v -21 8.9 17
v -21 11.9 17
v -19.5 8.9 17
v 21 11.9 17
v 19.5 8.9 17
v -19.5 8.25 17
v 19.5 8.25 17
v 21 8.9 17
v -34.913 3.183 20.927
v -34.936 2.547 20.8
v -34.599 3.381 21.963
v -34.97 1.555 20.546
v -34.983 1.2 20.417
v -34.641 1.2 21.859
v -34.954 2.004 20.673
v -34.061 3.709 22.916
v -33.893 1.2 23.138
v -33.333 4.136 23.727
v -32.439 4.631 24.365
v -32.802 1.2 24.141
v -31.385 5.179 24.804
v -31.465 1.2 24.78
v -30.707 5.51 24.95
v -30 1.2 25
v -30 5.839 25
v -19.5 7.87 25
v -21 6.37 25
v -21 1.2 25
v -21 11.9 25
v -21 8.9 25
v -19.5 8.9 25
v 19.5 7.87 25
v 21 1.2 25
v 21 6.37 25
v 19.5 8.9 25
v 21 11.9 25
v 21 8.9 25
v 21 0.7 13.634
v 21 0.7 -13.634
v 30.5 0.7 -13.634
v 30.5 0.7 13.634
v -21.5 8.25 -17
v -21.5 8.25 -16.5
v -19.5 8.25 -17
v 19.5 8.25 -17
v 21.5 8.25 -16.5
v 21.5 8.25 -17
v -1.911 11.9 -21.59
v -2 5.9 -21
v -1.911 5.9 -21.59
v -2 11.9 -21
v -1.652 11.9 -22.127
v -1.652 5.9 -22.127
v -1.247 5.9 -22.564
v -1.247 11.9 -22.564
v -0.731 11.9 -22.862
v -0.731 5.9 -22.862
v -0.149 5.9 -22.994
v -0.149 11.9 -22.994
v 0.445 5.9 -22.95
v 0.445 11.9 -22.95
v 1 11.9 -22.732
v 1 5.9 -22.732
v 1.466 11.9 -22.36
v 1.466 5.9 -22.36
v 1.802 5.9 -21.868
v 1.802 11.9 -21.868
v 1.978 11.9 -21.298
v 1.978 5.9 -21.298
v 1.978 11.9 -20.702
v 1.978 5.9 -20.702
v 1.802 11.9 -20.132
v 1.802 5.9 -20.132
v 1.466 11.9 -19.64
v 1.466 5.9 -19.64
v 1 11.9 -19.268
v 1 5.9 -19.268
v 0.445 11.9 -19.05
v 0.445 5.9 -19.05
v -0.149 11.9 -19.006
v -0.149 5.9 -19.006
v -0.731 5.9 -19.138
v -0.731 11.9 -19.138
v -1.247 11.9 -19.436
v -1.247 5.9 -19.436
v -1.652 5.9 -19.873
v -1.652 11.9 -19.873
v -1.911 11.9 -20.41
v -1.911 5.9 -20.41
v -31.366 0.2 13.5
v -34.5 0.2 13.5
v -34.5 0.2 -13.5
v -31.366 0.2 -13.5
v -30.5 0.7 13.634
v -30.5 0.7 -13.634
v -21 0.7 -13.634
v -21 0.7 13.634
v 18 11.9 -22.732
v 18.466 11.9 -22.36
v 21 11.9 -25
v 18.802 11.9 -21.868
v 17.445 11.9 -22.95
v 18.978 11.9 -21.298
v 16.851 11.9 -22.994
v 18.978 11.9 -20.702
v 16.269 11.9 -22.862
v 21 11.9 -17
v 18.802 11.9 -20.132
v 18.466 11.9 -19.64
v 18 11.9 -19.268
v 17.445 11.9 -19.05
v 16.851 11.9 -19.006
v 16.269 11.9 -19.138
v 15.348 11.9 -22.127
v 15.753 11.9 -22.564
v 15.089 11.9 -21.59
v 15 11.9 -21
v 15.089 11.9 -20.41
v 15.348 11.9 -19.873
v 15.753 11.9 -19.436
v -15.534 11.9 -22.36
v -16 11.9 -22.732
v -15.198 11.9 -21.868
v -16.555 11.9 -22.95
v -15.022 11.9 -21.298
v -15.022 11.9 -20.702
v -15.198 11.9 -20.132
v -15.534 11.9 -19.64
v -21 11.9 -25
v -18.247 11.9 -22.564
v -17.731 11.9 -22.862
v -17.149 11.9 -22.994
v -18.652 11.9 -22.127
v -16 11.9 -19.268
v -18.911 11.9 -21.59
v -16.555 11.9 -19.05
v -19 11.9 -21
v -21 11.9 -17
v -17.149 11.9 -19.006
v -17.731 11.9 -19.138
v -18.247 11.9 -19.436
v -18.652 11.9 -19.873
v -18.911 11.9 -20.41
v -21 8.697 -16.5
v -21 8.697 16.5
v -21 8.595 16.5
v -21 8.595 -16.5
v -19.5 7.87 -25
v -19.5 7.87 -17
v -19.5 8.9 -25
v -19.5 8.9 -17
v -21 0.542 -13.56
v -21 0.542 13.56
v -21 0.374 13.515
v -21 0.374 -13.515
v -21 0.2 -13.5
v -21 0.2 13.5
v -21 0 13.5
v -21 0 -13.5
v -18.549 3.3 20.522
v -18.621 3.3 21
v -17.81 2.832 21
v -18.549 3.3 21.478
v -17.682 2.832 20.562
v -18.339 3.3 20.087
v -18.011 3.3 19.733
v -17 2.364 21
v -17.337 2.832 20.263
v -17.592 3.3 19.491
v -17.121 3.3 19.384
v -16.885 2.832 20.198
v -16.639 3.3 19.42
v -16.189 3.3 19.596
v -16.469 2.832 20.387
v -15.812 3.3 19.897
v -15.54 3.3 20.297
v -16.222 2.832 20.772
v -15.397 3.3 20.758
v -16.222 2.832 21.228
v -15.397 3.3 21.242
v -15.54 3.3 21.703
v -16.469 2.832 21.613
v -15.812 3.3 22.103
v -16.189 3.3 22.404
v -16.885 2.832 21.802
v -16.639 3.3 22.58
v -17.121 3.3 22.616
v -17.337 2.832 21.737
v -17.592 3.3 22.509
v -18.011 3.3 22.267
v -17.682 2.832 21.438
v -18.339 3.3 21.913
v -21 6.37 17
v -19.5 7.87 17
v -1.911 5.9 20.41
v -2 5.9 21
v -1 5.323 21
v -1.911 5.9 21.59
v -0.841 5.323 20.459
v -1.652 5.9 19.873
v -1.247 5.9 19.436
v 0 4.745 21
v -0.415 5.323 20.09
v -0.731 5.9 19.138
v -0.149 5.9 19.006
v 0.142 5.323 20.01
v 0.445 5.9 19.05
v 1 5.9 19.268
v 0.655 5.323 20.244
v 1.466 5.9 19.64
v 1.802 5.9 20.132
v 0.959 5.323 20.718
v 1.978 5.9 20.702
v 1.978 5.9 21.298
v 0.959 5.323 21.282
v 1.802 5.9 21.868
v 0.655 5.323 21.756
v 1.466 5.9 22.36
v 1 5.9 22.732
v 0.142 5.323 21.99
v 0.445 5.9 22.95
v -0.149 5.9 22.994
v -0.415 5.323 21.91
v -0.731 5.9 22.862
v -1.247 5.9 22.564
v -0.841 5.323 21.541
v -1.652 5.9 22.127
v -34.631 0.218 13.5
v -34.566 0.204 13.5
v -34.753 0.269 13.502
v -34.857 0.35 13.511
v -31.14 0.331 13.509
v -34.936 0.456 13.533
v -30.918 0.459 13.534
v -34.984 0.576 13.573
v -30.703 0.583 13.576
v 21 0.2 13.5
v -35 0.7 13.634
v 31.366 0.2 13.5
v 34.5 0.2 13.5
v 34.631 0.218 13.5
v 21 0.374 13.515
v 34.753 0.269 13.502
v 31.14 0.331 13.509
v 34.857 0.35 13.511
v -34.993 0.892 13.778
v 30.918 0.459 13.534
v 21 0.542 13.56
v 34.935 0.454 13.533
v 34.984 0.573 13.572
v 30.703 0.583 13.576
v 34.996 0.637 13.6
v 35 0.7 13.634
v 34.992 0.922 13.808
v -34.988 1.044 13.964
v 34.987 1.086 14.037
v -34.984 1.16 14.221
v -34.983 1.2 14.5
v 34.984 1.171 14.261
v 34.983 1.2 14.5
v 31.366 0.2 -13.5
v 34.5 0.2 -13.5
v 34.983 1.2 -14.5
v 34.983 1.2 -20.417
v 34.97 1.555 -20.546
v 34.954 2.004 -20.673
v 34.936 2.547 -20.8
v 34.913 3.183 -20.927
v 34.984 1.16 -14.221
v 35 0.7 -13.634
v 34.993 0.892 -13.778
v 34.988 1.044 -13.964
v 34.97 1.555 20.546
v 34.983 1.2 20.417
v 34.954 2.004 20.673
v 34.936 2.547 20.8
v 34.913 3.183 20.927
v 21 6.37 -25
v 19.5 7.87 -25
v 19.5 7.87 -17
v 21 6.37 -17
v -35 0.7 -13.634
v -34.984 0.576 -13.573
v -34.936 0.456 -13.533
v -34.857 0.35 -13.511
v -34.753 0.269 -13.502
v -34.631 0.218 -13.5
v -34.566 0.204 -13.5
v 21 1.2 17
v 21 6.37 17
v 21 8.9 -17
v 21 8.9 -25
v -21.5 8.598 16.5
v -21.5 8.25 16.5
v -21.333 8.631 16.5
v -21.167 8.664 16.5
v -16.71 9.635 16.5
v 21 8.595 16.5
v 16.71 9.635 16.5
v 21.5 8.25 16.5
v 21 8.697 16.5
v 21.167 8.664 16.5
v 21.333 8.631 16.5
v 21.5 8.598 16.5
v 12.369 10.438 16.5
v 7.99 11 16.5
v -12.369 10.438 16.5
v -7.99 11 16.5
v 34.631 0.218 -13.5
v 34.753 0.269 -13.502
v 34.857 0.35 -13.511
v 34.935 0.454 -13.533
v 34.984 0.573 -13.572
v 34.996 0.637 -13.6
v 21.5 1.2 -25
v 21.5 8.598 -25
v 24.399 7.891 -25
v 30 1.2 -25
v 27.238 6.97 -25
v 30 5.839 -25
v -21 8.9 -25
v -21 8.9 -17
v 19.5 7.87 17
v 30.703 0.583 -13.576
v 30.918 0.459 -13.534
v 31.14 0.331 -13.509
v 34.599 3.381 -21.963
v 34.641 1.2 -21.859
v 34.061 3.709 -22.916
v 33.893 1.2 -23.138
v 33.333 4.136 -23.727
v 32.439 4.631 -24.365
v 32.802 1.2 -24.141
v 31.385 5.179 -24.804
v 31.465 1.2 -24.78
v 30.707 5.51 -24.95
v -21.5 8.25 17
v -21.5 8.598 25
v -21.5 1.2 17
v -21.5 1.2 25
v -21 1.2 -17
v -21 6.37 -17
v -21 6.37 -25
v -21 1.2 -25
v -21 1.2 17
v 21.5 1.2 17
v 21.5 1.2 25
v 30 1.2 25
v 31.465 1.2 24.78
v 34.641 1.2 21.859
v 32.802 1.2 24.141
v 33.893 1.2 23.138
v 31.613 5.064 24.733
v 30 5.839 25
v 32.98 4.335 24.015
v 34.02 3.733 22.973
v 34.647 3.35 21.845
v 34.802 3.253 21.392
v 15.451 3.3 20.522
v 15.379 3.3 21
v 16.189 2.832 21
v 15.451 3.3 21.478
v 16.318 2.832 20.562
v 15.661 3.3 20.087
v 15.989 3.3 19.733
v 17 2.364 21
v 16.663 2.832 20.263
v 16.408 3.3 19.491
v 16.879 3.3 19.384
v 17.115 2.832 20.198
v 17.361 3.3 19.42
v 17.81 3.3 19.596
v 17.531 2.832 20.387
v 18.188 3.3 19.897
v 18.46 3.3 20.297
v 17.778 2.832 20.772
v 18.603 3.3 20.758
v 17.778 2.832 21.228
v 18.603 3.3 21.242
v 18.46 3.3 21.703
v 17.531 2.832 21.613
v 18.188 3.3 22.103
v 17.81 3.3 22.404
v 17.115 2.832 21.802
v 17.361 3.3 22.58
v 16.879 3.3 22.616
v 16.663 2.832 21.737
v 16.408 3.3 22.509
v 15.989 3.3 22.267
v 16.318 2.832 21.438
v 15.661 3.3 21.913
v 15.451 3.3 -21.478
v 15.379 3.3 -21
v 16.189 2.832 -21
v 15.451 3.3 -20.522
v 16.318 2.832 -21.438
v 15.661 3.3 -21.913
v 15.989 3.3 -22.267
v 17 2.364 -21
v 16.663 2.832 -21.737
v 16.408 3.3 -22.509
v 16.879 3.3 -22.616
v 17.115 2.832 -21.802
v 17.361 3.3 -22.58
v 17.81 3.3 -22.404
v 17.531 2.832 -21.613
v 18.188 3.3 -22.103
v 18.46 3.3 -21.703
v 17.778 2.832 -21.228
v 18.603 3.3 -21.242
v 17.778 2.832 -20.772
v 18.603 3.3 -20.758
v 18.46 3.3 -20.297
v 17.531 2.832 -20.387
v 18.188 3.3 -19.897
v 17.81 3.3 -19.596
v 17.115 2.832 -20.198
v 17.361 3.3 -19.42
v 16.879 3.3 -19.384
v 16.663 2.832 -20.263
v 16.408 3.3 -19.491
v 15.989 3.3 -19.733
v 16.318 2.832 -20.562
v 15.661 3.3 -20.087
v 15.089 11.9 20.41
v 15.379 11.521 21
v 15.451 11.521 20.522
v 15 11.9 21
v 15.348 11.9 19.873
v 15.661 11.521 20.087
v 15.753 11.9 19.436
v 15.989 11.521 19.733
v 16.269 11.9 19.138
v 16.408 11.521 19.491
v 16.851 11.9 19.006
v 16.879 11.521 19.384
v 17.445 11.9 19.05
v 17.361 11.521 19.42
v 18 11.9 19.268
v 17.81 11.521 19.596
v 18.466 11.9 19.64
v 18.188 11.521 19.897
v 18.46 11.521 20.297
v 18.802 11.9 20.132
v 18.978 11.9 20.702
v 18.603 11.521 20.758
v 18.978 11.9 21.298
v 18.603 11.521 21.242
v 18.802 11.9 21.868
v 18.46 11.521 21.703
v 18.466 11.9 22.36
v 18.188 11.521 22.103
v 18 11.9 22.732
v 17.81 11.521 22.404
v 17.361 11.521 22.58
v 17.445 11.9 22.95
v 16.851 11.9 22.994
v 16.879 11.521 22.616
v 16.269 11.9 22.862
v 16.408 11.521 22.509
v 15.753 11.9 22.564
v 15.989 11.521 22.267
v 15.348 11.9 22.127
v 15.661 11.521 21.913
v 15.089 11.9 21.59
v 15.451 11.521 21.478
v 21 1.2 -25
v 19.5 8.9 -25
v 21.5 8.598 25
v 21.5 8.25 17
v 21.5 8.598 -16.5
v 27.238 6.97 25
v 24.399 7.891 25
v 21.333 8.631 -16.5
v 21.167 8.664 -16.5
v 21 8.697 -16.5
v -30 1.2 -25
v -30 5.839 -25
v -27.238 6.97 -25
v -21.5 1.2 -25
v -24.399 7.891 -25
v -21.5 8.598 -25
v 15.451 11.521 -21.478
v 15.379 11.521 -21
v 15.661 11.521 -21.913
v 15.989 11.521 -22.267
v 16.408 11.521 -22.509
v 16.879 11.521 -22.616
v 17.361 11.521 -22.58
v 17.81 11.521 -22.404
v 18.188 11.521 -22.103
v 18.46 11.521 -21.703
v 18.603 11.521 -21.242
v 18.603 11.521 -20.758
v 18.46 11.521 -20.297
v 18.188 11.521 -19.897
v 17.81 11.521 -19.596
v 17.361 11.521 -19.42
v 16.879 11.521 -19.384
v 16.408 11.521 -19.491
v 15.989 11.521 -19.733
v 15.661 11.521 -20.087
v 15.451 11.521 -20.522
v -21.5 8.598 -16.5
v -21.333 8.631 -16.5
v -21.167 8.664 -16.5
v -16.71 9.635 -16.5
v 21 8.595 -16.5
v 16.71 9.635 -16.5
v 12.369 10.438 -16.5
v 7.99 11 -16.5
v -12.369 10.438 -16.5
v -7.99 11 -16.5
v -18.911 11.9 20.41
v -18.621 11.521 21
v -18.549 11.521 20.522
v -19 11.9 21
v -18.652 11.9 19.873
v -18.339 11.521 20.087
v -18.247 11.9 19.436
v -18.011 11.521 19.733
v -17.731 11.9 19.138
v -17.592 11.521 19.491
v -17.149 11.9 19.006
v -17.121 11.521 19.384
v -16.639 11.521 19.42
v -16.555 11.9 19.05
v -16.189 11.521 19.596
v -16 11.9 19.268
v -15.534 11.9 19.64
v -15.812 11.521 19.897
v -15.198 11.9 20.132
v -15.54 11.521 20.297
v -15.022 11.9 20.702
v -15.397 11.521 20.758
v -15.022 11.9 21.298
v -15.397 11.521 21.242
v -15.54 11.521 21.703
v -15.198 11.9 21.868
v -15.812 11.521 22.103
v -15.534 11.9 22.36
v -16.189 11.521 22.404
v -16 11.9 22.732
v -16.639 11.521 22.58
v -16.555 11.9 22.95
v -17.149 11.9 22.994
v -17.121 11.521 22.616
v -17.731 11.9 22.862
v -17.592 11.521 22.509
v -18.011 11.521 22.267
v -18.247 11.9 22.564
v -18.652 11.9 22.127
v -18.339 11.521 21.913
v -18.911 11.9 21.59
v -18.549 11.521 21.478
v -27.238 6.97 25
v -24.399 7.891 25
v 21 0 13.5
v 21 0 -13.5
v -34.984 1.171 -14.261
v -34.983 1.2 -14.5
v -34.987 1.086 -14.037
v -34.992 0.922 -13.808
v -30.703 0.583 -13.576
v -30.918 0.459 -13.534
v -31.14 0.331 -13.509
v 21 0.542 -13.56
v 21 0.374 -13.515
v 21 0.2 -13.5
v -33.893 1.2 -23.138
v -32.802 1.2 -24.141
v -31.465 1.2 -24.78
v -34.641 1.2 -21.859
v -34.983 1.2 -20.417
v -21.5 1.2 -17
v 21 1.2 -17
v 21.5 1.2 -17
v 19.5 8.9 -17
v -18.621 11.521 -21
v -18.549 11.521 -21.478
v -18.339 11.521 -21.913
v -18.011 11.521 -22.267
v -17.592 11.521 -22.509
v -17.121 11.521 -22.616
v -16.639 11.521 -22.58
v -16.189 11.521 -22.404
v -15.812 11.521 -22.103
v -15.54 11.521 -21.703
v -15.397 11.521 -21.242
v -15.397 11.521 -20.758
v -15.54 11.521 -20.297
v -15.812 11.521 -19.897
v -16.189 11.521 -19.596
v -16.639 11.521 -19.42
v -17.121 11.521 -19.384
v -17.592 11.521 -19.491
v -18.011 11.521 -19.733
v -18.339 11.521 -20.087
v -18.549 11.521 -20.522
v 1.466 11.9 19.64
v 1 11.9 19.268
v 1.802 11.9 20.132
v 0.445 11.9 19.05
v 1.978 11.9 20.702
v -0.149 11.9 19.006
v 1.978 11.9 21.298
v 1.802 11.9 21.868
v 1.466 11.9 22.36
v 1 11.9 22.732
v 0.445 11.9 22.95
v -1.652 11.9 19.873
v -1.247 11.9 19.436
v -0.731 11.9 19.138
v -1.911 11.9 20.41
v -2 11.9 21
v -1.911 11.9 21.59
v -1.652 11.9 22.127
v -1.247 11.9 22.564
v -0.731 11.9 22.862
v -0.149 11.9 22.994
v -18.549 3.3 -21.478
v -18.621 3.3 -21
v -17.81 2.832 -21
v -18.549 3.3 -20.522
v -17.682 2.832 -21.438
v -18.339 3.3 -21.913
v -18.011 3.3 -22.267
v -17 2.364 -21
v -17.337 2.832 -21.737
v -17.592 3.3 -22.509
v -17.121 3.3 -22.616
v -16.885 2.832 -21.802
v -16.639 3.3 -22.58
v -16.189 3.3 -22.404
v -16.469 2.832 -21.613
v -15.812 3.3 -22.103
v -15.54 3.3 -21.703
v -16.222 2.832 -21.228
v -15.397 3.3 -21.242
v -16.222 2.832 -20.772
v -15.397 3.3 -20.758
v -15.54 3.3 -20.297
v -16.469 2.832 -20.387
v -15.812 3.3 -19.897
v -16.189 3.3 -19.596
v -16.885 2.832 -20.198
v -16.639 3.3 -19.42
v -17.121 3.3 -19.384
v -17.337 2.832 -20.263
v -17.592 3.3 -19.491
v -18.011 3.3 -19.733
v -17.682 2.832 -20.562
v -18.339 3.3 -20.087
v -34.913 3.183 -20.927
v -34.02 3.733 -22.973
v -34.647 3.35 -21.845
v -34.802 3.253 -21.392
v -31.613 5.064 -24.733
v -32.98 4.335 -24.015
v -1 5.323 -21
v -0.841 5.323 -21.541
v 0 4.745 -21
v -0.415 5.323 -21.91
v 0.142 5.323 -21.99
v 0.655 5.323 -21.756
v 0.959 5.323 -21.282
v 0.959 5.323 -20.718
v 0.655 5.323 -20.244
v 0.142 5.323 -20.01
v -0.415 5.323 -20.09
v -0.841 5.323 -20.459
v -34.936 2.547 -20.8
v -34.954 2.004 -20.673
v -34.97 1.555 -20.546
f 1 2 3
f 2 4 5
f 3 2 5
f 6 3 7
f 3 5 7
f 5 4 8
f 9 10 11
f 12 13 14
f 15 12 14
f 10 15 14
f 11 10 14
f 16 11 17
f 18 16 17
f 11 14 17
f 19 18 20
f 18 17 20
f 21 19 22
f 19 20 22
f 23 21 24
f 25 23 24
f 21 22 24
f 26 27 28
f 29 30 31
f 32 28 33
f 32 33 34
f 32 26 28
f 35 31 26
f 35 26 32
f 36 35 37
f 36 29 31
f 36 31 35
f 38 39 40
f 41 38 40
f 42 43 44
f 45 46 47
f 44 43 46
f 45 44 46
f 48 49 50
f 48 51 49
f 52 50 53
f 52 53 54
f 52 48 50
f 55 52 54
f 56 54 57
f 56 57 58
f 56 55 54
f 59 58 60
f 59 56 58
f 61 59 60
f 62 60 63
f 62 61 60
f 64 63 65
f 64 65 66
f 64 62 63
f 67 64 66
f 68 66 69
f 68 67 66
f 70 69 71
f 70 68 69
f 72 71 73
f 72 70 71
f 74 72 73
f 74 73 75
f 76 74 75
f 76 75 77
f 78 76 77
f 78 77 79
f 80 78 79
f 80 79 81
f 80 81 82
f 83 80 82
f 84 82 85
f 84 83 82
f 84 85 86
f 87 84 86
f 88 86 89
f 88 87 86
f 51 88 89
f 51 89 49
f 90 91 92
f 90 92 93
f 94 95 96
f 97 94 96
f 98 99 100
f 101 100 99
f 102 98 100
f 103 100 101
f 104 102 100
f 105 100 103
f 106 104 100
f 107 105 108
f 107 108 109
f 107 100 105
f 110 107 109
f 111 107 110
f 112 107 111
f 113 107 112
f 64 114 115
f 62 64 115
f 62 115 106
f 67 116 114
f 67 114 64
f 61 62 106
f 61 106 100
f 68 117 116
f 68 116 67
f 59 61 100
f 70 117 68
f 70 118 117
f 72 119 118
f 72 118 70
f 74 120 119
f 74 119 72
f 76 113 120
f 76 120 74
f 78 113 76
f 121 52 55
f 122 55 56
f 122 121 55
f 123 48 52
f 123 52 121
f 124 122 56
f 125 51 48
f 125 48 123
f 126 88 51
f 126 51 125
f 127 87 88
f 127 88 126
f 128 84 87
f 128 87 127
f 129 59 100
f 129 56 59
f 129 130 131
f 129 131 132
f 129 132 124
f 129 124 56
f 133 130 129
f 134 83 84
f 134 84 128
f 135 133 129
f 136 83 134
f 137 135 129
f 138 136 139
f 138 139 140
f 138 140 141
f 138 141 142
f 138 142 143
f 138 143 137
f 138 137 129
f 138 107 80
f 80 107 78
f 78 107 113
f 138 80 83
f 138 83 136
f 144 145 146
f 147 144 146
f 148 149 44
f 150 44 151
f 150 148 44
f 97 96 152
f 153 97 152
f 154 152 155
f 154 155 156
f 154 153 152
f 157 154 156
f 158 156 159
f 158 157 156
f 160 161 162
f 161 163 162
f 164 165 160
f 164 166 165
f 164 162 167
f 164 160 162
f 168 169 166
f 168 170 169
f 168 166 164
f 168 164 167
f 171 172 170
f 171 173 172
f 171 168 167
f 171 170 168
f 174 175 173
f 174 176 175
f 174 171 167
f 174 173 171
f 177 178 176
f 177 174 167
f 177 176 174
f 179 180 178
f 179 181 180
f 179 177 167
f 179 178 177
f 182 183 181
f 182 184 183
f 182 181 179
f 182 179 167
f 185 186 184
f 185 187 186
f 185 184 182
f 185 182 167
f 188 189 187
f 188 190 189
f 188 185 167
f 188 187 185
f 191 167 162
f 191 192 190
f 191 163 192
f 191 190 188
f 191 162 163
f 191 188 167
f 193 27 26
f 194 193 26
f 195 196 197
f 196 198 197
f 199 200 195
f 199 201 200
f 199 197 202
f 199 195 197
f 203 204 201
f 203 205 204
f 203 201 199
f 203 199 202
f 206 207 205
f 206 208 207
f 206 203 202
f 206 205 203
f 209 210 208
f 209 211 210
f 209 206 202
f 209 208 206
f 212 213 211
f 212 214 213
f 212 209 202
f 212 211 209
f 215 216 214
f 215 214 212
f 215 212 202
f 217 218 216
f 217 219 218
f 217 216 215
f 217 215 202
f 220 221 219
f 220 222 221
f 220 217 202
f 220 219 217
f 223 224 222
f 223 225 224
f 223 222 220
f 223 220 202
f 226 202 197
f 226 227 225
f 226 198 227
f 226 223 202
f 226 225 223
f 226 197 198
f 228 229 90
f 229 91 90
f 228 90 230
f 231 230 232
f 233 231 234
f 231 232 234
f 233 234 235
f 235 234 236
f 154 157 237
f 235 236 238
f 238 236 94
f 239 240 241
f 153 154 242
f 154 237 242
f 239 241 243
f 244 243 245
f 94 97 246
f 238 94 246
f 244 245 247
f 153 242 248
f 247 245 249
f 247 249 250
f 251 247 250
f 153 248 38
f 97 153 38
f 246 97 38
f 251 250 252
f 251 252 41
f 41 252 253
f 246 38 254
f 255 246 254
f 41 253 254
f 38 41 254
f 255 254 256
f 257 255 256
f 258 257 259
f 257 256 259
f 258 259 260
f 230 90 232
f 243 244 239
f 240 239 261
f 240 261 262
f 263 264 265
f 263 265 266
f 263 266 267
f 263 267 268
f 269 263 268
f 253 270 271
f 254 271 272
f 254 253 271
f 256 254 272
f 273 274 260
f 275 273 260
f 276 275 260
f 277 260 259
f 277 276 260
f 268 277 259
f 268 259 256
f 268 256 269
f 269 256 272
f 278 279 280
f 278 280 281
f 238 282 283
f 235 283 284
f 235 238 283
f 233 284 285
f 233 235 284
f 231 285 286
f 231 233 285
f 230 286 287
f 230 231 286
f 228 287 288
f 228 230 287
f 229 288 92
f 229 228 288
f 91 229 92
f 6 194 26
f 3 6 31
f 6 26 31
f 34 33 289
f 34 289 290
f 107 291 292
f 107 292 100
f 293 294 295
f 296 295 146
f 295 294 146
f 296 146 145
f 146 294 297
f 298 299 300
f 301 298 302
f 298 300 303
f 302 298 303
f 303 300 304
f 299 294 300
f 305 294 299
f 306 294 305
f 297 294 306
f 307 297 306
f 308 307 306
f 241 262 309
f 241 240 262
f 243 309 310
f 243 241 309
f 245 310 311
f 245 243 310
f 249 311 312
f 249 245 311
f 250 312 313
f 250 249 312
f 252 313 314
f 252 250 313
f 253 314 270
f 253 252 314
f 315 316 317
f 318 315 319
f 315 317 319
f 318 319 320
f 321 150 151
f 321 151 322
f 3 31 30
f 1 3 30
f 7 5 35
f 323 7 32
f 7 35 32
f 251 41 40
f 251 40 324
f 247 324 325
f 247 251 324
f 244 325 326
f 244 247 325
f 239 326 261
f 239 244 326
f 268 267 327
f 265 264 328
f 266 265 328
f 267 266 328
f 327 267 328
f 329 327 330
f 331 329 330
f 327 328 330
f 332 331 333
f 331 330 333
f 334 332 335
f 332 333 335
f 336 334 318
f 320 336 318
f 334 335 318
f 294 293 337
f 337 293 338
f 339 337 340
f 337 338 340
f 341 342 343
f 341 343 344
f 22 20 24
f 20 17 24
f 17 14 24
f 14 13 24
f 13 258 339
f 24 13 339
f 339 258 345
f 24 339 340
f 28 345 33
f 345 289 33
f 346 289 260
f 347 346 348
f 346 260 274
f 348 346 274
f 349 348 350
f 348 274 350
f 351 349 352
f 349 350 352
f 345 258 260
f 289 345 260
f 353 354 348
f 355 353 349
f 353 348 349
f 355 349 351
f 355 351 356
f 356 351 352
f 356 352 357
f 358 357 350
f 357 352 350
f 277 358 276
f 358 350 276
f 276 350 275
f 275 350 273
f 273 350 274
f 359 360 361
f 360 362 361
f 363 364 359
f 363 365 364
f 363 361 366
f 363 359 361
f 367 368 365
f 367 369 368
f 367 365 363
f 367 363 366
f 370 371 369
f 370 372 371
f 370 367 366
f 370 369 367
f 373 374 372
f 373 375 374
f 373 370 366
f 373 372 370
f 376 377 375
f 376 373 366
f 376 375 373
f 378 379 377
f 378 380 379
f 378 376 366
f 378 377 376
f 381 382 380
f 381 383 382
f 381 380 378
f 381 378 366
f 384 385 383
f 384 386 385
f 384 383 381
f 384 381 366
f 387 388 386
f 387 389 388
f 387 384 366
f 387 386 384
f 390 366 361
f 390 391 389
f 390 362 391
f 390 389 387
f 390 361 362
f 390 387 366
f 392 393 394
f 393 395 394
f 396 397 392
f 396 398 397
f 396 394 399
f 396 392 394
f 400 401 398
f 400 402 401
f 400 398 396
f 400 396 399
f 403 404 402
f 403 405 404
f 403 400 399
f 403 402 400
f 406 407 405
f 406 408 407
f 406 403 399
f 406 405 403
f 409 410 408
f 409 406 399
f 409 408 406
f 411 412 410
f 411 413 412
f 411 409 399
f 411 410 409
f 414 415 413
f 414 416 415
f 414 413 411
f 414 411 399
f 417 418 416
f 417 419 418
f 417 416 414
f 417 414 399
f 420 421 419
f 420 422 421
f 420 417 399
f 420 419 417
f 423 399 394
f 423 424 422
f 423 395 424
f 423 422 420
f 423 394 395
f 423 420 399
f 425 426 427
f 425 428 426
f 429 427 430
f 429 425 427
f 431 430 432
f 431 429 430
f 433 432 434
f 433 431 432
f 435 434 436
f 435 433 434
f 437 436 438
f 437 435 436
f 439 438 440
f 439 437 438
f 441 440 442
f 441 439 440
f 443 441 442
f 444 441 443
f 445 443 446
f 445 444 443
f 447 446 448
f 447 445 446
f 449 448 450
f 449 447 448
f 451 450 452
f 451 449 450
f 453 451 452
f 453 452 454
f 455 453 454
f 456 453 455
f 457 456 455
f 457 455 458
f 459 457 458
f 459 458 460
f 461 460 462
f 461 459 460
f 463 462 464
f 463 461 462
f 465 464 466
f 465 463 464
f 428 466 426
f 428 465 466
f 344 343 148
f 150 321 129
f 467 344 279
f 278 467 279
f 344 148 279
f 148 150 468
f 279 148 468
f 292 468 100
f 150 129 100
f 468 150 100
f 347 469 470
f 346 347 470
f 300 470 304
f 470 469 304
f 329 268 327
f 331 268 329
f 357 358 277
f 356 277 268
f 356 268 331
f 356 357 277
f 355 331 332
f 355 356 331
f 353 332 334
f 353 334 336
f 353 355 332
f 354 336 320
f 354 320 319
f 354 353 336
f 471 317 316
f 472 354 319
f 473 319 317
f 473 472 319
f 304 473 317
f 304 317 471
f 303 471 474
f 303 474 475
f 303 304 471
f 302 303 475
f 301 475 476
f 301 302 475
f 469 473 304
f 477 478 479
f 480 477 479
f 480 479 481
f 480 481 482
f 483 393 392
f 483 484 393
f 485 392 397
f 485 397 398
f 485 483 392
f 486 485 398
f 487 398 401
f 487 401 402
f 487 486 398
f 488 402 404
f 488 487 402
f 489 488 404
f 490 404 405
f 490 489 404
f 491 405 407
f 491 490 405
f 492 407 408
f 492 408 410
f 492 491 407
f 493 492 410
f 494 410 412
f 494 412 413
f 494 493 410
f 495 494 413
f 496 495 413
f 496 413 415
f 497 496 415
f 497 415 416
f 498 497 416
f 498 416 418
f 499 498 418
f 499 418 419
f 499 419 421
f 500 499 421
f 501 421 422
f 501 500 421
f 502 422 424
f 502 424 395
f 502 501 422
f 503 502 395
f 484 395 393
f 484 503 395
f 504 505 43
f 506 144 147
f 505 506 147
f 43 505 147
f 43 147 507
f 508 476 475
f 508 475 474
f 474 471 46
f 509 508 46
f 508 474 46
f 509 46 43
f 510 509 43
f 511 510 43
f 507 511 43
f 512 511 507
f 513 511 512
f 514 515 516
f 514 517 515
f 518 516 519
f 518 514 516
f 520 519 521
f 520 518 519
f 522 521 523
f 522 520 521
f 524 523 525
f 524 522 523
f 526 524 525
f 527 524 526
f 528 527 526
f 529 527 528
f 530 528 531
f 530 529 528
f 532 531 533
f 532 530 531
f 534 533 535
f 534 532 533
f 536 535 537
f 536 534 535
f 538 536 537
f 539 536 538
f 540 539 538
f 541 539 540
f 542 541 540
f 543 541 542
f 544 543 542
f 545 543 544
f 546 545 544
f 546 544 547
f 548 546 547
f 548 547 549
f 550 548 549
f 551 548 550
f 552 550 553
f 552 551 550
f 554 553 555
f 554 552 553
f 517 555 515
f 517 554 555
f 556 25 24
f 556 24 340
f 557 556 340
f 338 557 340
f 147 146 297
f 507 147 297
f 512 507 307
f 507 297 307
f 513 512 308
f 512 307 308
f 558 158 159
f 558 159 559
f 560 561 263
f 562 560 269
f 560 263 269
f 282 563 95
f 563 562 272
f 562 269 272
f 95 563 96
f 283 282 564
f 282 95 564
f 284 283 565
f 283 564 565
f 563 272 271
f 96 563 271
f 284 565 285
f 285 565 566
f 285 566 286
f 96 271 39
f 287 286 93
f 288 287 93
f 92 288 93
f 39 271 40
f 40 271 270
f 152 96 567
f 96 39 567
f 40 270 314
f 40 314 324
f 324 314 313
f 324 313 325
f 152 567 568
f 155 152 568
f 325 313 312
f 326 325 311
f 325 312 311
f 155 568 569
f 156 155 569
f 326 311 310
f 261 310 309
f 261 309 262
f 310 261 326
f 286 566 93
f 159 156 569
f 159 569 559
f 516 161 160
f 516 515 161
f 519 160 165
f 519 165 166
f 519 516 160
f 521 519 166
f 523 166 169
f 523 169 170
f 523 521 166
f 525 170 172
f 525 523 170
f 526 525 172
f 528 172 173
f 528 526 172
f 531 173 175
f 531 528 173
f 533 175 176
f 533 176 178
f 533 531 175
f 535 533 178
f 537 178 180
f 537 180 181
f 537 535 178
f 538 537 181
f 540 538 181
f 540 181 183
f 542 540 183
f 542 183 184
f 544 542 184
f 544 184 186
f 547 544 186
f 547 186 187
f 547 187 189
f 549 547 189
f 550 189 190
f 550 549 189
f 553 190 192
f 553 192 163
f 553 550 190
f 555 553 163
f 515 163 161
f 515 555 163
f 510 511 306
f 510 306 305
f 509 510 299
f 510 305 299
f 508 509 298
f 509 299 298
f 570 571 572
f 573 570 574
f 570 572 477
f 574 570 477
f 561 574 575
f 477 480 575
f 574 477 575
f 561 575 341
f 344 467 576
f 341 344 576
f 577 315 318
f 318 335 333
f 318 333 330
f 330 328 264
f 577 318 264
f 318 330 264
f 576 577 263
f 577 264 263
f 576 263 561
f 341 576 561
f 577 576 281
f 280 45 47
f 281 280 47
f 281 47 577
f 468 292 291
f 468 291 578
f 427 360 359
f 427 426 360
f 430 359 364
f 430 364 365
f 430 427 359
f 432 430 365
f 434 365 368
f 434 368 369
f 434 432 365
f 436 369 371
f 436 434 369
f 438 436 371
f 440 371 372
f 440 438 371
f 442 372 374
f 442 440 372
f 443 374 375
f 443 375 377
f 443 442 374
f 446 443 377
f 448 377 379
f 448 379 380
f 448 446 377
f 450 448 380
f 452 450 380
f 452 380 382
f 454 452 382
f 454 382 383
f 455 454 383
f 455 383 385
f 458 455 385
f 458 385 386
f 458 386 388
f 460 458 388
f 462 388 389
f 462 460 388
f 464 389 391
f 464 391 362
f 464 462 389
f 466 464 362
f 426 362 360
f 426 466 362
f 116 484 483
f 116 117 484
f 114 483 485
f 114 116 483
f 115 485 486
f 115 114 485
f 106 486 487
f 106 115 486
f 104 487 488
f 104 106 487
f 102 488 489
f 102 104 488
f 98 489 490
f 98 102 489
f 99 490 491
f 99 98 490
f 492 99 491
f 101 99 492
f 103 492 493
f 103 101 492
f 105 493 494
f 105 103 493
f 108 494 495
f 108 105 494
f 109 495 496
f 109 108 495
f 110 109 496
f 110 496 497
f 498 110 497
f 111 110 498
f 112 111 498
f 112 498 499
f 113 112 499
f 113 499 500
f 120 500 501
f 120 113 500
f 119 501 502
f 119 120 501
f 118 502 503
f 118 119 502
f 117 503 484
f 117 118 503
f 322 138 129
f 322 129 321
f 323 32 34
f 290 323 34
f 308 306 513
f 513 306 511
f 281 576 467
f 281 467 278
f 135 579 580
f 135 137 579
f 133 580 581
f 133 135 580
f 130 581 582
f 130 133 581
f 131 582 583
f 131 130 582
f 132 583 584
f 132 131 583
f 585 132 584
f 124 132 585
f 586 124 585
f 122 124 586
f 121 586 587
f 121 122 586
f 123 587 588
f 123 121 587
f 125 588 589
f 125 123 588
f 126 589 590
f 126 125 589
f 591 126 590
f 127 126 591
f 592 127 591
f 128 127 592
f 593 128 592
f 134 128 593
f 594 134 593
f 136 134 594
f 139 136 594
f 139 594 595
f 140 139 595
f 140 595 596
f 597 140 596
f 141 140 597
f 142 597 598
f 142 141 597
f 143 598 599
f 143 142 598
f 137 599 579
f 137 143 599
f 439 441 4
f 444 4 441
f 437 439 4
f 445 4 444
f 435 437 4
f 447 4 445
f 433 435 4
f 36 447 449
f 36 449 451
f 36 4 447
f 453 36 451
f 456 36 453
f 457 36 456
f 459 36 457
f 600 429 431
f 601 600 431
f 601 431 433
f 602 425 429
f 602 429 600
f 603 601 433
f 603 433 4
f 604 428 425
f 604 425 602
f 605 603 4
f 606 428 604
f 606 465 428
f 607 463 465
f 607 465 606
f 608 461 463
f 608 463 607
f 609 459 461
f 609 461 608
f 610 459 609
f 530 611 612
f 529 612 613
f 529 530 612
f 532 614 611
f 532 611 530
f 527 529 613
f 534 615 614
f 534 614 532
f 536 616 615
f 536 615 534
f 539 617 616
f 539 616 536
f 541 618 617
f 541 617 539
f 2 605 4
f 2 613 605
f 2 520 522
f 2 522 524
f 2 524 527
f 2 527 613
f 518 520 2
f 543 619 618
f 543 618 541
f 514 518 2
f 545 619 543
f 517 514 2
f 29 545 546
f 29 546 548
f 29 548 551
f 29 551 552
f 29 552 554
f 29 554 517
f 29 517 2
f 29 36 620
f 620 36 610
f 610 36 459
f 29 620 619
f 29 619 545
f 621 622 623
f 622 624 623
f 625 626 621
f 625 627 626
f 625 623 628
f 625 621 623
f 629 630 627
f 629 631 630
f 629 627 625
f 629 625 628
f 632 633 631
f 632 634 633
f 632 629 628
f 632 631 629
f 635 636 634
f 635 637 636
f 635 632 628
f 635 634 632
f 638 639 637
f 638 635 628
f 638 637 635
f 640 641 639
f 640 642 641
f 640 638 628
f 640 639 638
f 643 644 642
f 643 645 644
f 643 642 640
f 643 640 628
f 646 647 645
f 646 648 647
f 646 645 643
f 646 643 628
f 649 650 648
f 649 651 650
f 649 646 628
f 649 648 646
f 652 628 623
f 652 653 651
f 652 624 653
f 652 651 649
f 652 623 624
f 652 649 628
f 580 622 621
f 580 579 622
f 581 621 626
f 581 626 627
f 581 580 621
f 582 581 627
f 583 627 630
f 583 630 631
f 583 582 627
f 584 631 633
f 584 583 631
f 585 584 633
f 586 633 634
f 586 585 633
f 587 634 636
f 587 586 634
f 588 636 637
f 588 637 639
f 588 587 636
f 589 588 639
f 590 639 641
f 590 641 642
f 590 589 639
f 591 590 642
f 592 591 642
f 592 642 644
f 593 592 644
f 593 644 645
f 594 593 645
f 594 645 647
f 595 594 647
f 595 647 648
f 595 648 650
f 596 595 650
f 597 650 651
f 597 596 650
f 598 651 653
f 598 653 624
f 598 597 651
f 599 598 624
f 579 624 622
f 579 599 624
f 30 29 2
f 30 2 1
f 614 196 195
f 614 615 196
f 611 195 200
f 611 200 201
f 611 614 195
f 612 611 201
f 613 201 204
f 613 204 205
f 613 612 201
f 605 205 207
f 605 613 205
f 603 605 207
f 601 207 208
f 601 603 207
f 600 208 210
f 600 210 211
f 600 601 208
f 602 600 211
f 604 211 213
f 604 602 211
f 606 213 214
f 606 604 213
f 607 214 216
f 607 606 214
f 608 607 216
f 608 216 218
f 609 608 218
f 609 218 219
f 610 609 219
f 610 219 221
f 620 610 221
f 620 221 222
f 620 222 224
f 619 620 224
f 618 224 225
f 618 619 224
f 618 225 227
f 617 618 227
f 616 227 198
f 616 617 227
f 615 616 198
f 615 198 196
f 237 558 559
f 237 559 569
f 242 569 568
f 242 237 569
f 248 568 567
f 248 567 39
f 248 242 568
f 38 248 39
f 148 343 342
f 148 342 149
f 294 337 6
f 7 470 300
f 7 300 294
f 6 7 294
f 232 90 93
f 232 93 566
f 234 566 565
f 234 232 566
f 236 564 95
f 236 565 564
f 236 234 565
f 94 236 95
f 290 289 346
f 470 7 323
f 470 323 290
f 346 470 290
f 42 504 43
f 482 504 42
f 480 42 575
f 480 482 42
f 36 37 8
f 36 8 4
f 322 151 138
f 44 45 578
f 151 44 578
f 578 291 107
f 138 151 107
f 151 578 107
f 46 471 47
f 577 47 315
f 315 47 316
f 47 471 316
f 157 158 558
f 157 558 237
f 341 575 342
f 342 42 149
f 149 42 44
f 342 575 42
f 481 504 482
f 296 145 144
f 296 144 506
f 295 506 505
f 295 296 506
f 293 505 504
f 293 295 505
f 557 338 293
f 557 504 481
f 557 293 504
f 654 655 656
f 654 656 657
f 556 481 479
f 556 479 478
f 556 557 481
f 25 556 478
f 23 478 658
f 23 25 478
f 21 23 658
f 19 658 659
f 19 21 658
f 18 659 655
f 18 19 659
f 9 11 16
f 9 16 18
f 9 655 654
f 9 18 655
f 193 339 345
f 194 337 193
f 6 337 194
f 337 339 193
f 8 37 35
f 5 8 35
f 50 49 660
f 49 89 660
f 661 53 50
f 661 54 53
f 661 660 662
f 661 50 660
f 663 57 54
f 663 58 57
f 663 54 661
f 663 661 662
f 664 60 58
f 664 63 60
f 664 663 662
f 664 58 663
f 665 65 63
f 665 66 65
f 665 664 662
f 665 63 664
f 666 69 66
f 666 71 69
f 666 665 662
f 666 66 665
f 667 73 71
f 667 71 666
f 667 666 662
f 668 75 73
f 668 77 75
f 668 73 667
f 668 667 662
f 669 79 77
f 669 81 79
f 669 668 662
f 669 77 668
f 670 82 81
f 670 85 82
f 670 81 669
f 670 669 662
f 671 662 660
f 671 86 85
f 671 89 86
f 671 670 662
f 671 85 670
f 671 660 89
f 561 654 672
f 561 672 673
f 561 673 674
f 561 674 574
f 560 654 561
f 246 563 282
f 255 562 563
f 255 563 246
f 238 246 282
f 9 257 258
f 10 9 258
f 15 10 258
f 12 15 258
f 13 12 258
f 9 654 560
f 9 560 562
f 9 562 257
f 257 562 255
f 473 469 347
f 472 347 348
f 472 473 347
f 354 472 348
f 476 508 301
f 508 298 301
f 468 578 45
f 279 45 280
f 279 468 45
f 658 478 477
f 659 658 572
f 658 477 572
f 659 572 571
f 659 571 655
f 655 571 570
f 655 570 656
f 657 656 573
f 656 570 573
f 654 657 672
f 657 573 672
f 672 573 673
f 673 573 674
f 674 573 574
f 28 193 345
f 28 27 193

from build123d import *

# Parameters (mm, degrees)
BOSS_EXTRUDE1_DEPTH      = 25
BOSS_EXTRUDE1_DEPTH_BACK = 25
CUT_EXTRUDE1_DEPTH       = 17
CUT_EXTRUDE1_DEPTH_BACK  = 17
CUT_EXTRUDE2_DEPTH       = 8
CUT_EXTRUDE3_DEPTH       = 8
CUT_EXTRUDE4_DEPTH       = 21.5
CUT_EXTRUDE4_DEPTH_BACK  = 21.5
CUT_EXTRUDE5_DEPTH       = 35
CUT_EXTRUDE5_DEPTH_BACK  = 35
CUT_EXTRUDE6_DEPTH       = 29
CUT_EXTRUDE6_DEPTH_BACK  = 29
SKETCH7_W                = 107.768014059
SKETCH7_H                = 69.938488576


with BuildPart() as part:
    # Sketch1 → Boss-Extrude1 (new, two sides: drawn at the far end of the back side and taken through both)
    with BuildSketch(Plane.XY.offset(-BOSS_EXTRUDE1_DEPTH_BACK)):
        with BuildLine():
            Line((-34.5, 0.2), (-31.366025404, 0.2))
            Line((-31.366025404, 0.2), (-30.5, 0.7))
            Line((-30.5, 0.7), (-21, 0.7))
            Line((-21, 0.7), (-21, 0))
            Line((-21, 0), (21, 0))
            Line((21, 0), (21, 0.7))
            Line((21, 0.7), (30.5, 0.7))
            Line((30.5, 0.7), (31.366025404, 0.2))
            Line((31.366025404, 0.2), (34.5, 0.2))
            ThreePointArc((34.5, 0.2), (34.853553391, 0.346446609), (35, 0.7))
            Line((35, 0.7), (34.913292535, 3.182976936))
            ThreePointArc((34.913292535, 3.182976936), (28.216815843, 6.59637195), (21, 8.696761129))
            Line((21, 8.696761129), (21, 11.9))
            Line((21, 11.9), (-21, 11.9))
            Line((-21, 11.9), (-21, 8.696761129))
            ThreePointArc((-21, 8.696761129), (-28.216815843, 6.59637195), (-34.913292535, 3.182976936))
            Line((-34.913292535, 3.182976936), (-35, 0.7))
            ThreePointArc((-35, 0.7), (-34.853553391, 0.346446609), (-34.5, 0.2))
        make_face()
    extrude(amount=BOSS_EXTRUDE1_DEPTH + BOSS_EXTRUDE1_DEPTH_BACK)

    # Sketch2 → Cut-Extrude1 (cut, two sides: drawn at the far end of the back side and taken through both)
    with BuildSketch(Plane.XY.offset(-CUT_EXTRUDE1_DEPTH_BACK)):
        with BuildLine():
            Line((21, 8.594559394), (21, 30))
            Line((21, 30), (-21, 30))
            Line((-21, 30), (-21, 8.594559394))
            ThreePointArc((-21, 8.594559394), (0, 11.4), (21, 8.594559394))
        make_face()
    extrude(amount=CUT_EXTRUDE1_DEPTH + CUT_EXTRUDE1_DEPTH_BACK, mode=Mode.SUBTRACT)

    # Sketch3 → Cut-Extrude2 (cut)
    with BuildSketch(Plane.XY.offset(25)):
        Polygon((-21.5, -3), (-21, -3), (-21, 6.37), (-19.5, 7.87), (-19.5, 8.9), (-21, 8.9), (-21, 11.9), (21, 11.9), (21, 8.9), (19.5, 8.9), (19.5, 7.87), (21, 6.37), (21, -3), (21.5, -3), (21.5, 16.9), (-21.5, 16.9), align=None)
    extrude(amount=-CUT_EXTRUDE2_DEPTH, mode=Mode.SUBTRACT)

    # Sketch4 → Cut-Extrude3 (cut)
    with BuildSketch(Plane.XY.offset(-25)):
        Polygon((-21.5, -3), (-21, -3), (-21, 6.37), (-19.5, 7.87), (-19.5, 8.9), (-21, 8.9), (-21, 11.9), (21, 11.9), (21, 8.9), (19.5, 8.9), (19.5, 7.87), (21, 6.37), (21, -3), (21.5, -3), (21.5, 16.9), (-21.5, 16.9), align=None)
    extrude(amount=CUT_EXTRUDE3_DEPTH, mode=Mode.SUBTRACT)

    # Sketch5 → Cut-Extrude4 (cut, two sides: drawn at the far end of the back side and taken through both)
    with BuildSketch(Plane(origin=(0, 0, 0), x_dir=(0, 0, -1), z_dir=(1, 0, 0)).offset(-CUT_EXTRUDE4_DEPTH_BACK)):
        Polygon((-17, 8.25), (-16.5, 8.25), (-16.5, 11), (16.5, 11), (16.5, 8.25), (17, 8.25), (17, 12), (-17, 12), align=None)
    extrude(amount=CUT_EXTRUDE4_DEPTH + CUT_EXTRUDE4_DEPTH_BACK, mode=Mode.SUBTRACT)

    # Sketch6 → Cut-Extrude5 (cut, two sides: drawn at the far end of the back side and taken through both)
    with BuildSketch(Plane(origin=(0, 0, 0), x_dir=(0, 0, -1), z_dir=(1, 0, 0)).offset(-CUT_EXTRUDE5_DEPTH_BACK)):
        with BuildLine():
            Line((-30, 1.2), (-30, -5))
            Line((-30, -5), (30, -5))
            Line((30, -5), (30, 1.2))
            Line((30, 1.2), (14.5, 1.2))
            ThreePointArc((14.5, 1.2), (13.792893219, 0.907106781), (13.5, 0.2))
            Line((13.5, 0.2), (13.5, -2))
            Line((13.5, -2), (-13.5, -2))
            Line((-13.5, -2), (-13.5, 0.2))
            ThreePointArc((-13.5, 0.2), (-13.792893219, 0.907106781), (-14.5, 1.2))
            Line((-14.5, 1.2), (-30, 1.2))
        make_face()
    extrude(amount=CUT_EXTRUDE5_DEPTH + CUT_EXTRUDE5_DEPTH_BACK, mode=Mode.SUBTRACT)

    # Sketch7 → Cut-Extrude6 (cut, two sides: drawn at the far end of the back side and taken through both)
    with BuildSketch(Plane(origin=(0, 0, 0), x_dir=(-1, 0, 0), z_dir=(0, 1, 0)).offset(-CUT_EXTRUDE6_DEPTH_BACK)):
        with Locations((-2.122144112, 2.214411248)):
            Rectangle(SKETCH7_W, SKETCH7_H)
        with BuildLine():
            Line((35, -20), (35, 20))
            ThreePointArc((35, 20), (33.535533906, 23.535533906), (30, 25))
            Line((30, 25), (-30, 25))
            ThreePointArc((-30, 25), (-33.535533906, 23.535533906), (-35, 20))
            Line((-35, 20), (-35, -20))
            ThreePointArc((-35, -20), (-33.535533906, -23.535533906), (-30, -25))
            Line((-30, -25), (30, -25))
            ThreePointArc((30, -25), (33.535533906, -23.535533906), (35, -20))
        make_face(mode=Mode.SUBTRACT)
    extrude(amount=CUT_EXTRUDE6_DEPTH + CUT_EXTRUDE6_DEPTH_BACK, mode=Mode.SUBTRACT)

    # Sketch8 → Cut-Revolve1 (revolve, cut)
    with BuildSketch(Plane.XY.offset(21)):
        Polygon((-17, 2.364115214), (-18.621, 3.3), (-18.621, 11.521), (-19, 11.9), (-17, 11.9), align=None)
    revolve(axis=Axis((-17, 11.9, 21), (0, -1, 0)), mode=Mode.SUBTRACT)

    # Sketch9 → Cut-Revolve2 (revolve, cut)
    with BuildSketch(Plane.XY.offset(-21)):
        Polygon((-17, 2.364115214), (-18.621, 3.3), (-18.621, 11.521), (-19, 11.9), (-17, 11.9), align=None)
    revolve(axis=Axis((-17, 11.9, -21), (0, -1, 0)), mode=Mode.SUBTRACT)

    # Sketch10 → Cut-Revolve3 (revolve, cut)
    with BuildSketch(Plane.XY.offset(-21)):
        Polygon((17, 2.364115214), (15.379, 3.3), (15.379, 11.521), (15, 11.9), (17, 11.9), align=None)
    revolve(axis=Axis((17, 11.9, -21), (0, -1, 0)), mode=Mode.SUBTRACT)

    # Sketch11 → Cut-Revolve4 (revolve, cut)
    with BuildSketch(Plane.XY.offset(21)):
        Polygon((17, 2.364115214), (15.379, 3.3), (15.379, 11.521), (15, 11.9), (17, 11.9), align=None)
    revolve(axis=Axis((17, 11.9, 21), (0, -1, 0)), mode=Mode.SUBTRACT)

    # Sketch12 → Cut-Revolve5 (revolve, cut)
    with BuildSketch(Plane.XY.offset(21)):
        Polygon((0, 4.745299462), (-2, 5.9), (-2, 11.9), (0, 11.9), align=None)
    revolve(axis=Axis((0, 11.9, 21), (0, -1, 0)), mode=Mode.SUBTRACT)

    # Sketch13 → Cut-Revolve6 (revolve, cut)
    with BuildSketch(Plane.XY.offset(-21)):
        Polygon((0, 4.745299462), (-2, 5.9), (-2, 11.9), (0, 11.9), align=None)
    revolve(axis=Axis((0, 11.9, -21), (0, -1, 0)), mode=Mode.SUBTRACT)


solid = part.part
